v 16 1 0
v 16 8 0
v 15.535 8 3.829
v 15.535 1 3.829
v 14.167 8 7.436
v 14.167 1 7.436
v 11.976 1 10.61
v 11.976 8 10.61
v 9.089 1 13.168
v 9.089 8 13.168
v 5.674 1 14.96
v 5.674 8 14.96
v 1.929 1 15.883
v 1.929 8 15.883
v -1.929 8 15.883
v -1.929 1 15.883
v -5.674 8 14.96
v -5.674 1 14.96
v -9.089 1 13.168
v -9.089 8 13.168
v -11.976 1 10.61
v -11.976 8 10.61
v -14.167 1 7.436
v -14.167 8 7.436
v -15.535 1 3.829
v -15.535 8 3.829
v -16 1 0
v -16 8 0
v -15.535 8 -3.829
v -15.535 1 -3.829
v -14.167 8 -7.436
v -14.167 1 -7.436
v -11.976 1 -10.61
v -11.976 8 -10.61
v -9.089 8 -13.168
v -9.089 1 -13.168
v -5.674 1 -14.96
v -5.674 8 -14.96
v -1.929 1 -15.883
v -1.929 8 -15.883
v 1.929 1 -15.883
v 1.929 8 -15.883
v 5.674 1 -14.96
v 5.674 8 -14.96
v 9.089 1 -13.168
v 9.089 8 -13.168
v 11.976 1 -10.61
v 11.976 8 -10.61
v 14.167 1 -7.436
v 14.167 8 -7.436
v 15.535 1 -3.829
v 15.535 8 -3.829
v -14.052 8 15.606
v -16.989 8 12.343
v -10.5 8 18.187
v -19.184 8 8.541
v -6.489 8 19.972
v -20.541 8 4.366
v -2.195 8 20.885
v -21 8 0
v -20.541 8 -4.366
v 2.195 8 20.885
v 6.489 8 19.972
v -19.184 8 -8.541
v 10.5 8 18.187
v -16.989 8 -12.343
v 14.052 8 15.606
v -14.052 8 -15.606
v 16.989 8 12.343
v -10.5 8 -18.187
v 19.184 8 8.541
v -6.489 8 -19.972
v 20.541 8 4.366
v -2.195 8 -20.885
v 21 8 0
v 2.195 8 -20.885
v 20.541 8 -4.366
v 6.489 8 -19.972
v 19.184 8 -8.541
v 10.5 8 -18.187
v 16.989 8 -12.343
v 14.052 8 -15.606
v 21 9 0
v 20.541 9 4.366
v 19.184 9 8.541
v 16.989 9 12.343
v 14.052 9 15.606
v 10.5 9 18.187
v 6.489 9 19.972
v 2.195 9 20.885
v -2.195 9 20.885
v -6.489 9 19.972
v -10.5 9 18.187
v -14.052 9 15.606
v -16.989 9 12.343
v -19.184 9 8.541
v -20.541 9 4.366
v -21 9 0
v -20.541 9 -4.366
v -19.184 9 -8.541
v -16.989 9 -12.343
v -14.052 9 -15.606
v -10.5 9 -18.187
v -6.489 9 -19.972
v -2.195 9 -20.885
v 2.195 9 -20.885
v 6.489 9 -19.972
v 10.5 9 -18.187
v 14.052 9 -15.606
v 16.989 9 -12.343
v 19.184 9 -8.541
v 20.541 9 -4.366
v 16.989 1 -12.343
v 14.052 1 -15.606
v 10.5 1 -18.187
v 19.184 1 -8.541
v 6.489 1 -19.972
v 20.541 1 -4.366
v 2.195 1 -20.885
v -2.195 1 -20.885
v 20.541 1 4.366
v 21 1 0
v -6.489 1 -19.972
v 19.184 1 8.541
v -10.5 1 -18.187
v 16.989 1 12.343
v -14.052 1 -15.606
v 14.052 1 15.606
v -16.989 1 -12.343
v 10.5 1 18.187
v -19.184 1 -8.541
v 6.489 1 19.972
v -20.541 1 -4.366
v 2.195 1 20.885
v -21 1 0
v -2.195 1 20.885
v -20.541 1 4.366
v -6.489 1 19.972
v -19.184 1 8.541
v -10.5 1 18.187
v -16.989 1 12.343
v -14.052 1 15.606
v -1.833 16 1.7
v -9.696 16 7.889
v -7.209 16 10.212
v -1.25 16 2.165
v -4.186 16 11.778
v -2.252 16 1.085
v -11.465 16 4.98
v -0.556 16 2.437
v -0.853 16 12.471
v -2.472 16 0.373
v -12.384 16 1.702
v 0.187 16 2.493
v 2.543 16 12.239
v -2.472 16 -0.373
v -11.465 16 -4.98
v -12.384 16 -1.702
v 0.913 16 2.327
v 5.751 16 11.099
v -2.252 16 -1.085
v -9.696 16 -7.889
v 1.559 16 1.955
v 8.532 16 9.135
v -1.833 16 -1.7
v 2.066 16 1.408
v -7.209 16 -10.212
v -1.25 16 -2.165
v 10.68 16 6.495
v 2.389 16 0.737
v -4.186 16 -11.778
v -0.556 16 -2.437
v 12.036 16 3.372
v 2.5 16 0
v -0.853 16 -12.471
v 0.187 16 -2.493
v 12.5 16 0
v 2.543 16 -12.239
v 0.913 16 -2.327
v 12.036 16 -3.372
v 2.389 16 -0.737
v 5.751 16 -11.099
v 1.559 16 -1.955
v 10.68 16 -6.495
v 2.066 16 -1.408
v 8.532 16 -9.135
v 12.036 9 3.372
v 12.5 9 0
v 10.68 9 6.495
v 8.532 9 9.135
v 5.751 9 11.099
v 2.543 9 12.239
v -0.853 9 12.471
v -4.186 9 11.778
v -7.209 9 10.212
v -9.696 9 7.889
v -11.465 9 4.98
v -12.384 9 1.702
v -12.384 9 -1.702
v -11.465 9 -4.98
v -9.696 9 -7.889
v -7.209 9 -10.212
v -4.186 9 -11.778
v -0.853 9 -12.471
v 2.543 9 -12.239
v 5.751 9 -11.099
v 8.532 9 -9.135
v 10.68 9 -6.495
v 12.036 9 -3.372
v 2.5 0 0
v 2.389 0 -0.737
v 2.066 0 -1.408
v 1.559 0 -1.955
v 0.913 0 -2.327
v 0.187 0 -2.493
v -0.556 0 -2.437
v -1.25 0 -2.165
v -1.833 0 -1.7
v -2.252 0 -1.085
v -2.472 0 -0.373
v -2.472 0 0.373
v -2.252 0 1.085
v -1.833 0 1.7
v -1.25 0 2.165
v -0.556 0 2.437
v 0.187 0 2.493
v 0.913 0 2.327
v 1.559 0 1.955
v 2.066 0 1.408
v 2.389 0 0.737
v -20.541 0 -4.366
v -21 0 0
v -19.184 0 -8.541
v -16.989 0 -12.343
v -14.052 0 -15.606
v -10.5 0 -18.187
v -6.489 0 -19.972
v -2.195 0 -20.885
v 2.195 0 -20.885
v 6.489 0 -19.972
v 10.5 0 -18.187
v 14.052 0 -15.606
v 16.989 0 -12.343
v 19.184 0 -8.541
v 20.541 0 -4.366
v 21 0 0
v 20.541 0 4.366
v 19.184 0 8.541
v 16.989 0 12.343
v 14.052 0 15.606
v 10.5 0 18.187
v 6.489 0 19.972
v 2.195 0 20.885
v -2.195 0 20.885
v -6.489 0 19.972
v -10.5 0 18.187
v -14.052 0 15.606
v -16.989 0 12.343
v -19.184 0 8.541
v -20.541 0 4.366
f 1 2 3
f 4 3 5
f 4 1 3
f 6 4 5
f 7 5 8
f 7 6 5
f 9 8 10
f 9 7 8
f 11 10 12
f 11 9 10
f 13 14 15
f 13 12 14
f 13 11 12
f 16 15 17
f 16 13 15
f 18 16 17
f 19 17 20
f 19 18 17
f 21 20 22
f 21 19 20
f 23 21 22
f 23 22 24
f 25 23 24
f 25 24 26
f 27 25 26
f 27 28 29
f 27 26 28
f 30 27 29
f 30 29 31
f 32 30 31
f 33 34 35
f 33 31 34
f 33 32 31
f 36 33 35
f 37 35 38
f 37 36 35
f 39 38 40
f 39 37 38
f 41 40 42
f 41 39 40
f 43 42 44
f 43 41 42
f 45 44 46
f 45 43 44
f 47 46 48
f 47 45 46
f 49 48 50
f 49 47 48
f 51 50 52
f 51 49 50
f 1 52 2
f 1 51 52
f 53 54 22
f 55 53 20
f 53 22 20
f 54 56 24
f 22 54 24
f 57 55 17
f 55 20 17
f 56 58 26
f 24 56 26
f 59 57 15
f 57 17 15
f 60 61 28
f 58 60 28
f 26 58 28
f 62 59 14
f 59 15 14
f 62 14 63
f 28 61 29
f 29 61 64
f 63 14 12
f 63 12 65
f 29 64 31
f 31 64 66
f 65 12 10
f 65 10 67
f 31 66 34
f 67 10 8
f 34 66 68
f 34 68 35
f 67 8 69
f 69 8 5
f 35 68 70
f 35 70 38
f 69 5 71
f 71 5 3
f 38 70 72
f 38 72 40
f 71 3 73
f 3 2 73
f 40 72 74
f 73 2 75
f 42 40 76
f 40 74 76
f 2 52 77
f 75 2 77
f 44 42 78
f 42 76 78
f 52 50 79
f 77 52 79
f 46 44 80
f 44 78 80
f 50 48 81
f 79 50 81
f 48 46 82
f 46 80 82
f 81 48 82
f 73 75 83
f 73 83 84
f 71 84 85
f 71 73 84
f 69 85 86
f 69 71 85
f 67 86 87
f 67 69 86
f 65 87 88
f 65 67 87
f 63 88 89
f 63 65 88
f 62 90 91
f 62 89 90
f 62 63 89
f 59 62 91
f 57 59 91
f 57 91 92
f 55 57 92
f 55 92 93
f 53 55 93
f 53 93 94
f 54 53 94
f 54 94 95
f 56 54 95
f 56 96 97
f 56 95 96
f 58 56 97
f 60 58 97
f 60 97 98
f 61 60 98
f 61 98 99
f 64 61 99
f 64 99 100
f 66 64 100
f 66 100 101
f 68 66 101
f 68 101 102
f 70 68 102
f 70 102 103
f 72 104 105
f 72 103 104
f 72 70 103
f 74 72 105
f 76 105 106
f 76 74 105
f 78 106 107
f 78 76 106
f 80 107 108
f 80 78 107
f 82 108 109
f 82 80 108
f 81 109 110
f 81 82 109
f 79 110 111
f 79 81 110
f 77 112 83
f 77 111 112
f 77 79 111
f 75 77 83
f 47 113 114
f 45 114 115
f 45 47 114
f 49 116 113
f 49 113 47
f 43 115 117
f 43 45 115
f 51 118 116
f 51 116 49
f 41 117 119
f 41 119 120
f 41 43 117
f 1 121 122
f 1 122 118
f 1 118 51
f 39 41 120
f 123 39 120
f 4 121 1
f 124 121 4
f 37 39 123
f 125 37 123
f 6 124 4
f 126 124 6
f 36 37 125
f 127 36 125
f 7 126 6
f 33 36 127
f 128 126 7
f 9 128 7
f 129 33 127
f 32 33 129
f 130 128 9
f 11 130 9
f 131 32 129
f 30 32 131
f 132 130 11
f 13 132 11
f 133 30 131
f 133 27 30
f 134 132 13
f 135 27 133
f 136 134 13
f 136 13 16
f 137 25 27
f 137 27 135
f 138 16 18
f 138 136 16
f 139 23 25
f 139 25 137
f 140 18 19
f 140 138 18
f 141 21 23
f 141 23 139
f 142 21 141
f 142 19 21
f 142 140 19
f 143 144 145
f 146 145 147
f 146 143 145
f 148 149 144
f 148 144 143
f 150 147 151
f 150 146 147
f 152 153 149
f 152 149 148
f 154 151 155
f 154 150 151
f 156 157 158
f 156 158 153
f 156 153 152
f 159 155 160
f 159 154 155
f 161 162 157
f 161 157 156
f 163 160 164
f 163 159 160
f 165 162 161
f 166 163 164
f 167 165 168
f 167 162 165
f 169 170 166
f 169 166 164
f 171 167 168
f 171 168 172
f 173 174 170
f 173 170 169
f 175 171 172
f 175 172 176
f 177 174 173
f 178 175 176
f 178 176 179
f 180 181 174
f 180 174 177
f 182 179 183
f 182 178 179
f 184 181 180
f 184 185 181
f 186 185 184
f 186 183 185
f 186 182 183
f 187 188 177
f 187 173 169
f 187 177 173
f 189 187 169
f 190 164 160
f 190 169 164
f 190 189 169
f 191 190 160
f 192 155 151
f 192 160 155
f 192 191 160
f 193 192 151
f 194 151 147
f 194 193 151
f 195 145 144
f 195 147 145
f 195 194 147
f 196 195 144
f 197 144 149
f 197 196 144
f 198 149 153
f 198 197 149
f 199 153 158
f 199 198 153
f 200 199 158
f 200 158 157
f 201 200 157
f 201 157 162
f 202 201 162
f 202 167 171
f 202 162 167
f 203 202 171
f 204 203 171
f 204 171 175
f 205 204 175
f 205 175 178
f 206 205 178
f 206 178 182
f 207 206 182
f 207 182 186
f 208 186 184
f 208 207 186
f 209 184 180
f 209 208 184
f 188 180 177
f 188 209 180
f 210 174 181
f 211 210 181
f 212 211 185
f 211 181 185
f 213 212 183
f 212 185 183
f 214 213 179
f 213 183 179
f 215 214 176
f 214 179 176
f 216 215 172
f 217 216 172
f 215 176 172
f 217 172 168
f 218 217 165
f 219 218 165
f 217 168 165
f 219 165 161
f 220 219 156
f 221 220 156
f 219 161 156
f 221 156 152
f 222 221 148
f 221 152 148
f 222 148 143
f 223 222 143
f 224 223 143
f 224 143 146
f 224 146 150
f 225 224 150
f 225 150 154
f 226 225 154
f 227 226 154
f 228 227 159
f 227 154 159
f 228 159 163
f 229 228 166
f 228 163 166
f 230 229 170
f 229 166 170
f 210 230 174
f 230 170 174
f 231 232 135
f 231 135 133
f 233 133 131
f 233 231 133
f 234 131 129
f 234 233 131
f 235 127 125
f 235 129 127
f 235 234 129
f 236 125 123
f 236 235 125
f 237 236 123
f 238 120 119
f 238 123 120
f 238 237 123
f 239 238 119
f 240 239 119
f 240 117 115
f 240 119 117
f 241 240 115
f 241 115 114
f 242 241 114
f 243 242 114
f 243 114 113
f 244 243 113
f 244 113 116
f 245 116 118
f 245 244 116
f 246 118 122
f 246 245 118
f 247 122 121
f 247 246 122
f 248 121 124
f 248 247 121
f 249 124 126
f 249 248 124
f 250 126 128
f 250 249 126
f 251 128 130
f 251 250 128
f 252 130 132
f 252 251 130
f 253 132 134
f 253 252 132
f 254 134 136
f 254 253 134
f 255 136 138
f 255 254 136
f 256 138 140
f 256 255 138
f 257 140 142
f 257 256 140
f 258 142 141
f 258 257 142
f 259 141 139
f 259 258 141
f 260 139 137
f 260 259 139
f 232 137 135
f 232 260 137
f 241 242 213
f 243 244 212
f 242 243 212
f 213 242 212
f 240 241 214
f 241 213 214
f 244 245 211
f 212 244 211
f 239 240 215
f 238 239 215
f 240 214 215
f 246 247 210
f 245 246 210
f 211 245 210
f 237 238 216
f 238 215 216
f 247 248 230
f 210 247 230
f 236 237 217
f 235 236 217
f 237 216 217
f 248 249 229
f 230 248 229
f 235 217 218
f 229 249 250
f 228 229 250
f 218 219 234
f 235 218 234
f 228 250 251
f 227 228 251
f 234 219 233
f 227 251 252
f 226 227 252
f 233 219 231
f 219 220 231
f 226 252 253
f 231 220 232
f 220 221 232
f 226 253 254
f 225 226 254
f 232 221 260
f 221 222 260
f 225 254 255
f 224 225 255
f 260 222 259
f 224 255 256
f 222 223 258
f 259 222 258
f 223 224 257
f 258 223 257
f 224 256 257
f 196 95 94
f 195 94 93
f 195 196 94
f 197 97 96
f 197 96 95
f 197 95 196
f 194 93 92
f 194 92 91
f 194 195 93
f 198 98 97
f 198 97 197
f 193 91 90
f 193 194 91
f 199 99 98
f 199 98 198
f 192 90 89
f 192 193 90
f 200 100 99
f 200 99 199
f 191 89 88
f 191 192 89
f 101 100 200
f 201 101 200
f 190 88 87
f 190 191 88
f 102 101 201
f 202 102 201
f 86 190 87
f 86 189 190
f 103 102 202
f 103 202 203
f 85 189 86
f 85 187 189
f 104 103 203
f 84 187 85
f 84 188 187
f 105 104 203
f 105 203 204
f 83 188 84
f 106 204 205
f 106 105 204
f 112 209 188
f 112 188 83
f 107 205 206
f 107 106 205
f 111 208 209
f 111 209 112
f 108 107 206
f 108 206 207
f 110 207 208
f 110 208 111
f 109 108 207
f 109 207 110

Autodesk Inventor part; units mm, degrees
ref_plane "YZ Plane" through (0, 0, 0) normal (1, 0, 0) x (0, 1, 0)
ref_plane "XZ Plane" through (0, 0, 0) normal (0, 1, 0) x (-1, 0, 0)
ref_plane "XY Plane" through (0, 0, 0) normal (0, 0, 1) x (1, 0, 0)
sketch "Sketch1" plane through (0, 0, 0) normal (0, 1, 0) x (-1, 0, 0)
  circle A0 centre (0, 0) radius 21
  dimension "d0" = 42
extrude "Extrusion1" add sketch "Sketch1" along normal blind 1
sketch "Sketch2" plane through (0, 1, 0) normal (0, 1, 0) x (1, 0, 0)
  circle A0 centre (0, 0) radius 16
  dimension "d3" = 32
extrude "Extrusion2" add sketch "Sketch2" along normal blind 7
sketch "Sketch3" plane through (0, 8, 0) normal (0, 1, 0) x (1, 0, 0)
  circle A0 centre (0, 0) radius 21
extrude "Extrusion3" add sketch "Sketch3" along normal blind 1
sketch "Sketch4" plane through (0, 9, 0) normal (0, 1, 0) x (1, 0, 0)
  circle A0 centre (0, 0) radius 12.5
  dimension "d8" = 25
extrude "Extrusion4" add sketch "Sketch4" along normal blind 7
sketch "Sketch5" plane through (0, 16, 0) normal (0, 1, 0) x (1, 0, 0)
  circle A0 centre (0, 0) radius 2.5
  dimension "d11" = 5
extrude "Extrusion5" cut sketch "Sketch5" against normal through all
properties part number "GT2 60T"
